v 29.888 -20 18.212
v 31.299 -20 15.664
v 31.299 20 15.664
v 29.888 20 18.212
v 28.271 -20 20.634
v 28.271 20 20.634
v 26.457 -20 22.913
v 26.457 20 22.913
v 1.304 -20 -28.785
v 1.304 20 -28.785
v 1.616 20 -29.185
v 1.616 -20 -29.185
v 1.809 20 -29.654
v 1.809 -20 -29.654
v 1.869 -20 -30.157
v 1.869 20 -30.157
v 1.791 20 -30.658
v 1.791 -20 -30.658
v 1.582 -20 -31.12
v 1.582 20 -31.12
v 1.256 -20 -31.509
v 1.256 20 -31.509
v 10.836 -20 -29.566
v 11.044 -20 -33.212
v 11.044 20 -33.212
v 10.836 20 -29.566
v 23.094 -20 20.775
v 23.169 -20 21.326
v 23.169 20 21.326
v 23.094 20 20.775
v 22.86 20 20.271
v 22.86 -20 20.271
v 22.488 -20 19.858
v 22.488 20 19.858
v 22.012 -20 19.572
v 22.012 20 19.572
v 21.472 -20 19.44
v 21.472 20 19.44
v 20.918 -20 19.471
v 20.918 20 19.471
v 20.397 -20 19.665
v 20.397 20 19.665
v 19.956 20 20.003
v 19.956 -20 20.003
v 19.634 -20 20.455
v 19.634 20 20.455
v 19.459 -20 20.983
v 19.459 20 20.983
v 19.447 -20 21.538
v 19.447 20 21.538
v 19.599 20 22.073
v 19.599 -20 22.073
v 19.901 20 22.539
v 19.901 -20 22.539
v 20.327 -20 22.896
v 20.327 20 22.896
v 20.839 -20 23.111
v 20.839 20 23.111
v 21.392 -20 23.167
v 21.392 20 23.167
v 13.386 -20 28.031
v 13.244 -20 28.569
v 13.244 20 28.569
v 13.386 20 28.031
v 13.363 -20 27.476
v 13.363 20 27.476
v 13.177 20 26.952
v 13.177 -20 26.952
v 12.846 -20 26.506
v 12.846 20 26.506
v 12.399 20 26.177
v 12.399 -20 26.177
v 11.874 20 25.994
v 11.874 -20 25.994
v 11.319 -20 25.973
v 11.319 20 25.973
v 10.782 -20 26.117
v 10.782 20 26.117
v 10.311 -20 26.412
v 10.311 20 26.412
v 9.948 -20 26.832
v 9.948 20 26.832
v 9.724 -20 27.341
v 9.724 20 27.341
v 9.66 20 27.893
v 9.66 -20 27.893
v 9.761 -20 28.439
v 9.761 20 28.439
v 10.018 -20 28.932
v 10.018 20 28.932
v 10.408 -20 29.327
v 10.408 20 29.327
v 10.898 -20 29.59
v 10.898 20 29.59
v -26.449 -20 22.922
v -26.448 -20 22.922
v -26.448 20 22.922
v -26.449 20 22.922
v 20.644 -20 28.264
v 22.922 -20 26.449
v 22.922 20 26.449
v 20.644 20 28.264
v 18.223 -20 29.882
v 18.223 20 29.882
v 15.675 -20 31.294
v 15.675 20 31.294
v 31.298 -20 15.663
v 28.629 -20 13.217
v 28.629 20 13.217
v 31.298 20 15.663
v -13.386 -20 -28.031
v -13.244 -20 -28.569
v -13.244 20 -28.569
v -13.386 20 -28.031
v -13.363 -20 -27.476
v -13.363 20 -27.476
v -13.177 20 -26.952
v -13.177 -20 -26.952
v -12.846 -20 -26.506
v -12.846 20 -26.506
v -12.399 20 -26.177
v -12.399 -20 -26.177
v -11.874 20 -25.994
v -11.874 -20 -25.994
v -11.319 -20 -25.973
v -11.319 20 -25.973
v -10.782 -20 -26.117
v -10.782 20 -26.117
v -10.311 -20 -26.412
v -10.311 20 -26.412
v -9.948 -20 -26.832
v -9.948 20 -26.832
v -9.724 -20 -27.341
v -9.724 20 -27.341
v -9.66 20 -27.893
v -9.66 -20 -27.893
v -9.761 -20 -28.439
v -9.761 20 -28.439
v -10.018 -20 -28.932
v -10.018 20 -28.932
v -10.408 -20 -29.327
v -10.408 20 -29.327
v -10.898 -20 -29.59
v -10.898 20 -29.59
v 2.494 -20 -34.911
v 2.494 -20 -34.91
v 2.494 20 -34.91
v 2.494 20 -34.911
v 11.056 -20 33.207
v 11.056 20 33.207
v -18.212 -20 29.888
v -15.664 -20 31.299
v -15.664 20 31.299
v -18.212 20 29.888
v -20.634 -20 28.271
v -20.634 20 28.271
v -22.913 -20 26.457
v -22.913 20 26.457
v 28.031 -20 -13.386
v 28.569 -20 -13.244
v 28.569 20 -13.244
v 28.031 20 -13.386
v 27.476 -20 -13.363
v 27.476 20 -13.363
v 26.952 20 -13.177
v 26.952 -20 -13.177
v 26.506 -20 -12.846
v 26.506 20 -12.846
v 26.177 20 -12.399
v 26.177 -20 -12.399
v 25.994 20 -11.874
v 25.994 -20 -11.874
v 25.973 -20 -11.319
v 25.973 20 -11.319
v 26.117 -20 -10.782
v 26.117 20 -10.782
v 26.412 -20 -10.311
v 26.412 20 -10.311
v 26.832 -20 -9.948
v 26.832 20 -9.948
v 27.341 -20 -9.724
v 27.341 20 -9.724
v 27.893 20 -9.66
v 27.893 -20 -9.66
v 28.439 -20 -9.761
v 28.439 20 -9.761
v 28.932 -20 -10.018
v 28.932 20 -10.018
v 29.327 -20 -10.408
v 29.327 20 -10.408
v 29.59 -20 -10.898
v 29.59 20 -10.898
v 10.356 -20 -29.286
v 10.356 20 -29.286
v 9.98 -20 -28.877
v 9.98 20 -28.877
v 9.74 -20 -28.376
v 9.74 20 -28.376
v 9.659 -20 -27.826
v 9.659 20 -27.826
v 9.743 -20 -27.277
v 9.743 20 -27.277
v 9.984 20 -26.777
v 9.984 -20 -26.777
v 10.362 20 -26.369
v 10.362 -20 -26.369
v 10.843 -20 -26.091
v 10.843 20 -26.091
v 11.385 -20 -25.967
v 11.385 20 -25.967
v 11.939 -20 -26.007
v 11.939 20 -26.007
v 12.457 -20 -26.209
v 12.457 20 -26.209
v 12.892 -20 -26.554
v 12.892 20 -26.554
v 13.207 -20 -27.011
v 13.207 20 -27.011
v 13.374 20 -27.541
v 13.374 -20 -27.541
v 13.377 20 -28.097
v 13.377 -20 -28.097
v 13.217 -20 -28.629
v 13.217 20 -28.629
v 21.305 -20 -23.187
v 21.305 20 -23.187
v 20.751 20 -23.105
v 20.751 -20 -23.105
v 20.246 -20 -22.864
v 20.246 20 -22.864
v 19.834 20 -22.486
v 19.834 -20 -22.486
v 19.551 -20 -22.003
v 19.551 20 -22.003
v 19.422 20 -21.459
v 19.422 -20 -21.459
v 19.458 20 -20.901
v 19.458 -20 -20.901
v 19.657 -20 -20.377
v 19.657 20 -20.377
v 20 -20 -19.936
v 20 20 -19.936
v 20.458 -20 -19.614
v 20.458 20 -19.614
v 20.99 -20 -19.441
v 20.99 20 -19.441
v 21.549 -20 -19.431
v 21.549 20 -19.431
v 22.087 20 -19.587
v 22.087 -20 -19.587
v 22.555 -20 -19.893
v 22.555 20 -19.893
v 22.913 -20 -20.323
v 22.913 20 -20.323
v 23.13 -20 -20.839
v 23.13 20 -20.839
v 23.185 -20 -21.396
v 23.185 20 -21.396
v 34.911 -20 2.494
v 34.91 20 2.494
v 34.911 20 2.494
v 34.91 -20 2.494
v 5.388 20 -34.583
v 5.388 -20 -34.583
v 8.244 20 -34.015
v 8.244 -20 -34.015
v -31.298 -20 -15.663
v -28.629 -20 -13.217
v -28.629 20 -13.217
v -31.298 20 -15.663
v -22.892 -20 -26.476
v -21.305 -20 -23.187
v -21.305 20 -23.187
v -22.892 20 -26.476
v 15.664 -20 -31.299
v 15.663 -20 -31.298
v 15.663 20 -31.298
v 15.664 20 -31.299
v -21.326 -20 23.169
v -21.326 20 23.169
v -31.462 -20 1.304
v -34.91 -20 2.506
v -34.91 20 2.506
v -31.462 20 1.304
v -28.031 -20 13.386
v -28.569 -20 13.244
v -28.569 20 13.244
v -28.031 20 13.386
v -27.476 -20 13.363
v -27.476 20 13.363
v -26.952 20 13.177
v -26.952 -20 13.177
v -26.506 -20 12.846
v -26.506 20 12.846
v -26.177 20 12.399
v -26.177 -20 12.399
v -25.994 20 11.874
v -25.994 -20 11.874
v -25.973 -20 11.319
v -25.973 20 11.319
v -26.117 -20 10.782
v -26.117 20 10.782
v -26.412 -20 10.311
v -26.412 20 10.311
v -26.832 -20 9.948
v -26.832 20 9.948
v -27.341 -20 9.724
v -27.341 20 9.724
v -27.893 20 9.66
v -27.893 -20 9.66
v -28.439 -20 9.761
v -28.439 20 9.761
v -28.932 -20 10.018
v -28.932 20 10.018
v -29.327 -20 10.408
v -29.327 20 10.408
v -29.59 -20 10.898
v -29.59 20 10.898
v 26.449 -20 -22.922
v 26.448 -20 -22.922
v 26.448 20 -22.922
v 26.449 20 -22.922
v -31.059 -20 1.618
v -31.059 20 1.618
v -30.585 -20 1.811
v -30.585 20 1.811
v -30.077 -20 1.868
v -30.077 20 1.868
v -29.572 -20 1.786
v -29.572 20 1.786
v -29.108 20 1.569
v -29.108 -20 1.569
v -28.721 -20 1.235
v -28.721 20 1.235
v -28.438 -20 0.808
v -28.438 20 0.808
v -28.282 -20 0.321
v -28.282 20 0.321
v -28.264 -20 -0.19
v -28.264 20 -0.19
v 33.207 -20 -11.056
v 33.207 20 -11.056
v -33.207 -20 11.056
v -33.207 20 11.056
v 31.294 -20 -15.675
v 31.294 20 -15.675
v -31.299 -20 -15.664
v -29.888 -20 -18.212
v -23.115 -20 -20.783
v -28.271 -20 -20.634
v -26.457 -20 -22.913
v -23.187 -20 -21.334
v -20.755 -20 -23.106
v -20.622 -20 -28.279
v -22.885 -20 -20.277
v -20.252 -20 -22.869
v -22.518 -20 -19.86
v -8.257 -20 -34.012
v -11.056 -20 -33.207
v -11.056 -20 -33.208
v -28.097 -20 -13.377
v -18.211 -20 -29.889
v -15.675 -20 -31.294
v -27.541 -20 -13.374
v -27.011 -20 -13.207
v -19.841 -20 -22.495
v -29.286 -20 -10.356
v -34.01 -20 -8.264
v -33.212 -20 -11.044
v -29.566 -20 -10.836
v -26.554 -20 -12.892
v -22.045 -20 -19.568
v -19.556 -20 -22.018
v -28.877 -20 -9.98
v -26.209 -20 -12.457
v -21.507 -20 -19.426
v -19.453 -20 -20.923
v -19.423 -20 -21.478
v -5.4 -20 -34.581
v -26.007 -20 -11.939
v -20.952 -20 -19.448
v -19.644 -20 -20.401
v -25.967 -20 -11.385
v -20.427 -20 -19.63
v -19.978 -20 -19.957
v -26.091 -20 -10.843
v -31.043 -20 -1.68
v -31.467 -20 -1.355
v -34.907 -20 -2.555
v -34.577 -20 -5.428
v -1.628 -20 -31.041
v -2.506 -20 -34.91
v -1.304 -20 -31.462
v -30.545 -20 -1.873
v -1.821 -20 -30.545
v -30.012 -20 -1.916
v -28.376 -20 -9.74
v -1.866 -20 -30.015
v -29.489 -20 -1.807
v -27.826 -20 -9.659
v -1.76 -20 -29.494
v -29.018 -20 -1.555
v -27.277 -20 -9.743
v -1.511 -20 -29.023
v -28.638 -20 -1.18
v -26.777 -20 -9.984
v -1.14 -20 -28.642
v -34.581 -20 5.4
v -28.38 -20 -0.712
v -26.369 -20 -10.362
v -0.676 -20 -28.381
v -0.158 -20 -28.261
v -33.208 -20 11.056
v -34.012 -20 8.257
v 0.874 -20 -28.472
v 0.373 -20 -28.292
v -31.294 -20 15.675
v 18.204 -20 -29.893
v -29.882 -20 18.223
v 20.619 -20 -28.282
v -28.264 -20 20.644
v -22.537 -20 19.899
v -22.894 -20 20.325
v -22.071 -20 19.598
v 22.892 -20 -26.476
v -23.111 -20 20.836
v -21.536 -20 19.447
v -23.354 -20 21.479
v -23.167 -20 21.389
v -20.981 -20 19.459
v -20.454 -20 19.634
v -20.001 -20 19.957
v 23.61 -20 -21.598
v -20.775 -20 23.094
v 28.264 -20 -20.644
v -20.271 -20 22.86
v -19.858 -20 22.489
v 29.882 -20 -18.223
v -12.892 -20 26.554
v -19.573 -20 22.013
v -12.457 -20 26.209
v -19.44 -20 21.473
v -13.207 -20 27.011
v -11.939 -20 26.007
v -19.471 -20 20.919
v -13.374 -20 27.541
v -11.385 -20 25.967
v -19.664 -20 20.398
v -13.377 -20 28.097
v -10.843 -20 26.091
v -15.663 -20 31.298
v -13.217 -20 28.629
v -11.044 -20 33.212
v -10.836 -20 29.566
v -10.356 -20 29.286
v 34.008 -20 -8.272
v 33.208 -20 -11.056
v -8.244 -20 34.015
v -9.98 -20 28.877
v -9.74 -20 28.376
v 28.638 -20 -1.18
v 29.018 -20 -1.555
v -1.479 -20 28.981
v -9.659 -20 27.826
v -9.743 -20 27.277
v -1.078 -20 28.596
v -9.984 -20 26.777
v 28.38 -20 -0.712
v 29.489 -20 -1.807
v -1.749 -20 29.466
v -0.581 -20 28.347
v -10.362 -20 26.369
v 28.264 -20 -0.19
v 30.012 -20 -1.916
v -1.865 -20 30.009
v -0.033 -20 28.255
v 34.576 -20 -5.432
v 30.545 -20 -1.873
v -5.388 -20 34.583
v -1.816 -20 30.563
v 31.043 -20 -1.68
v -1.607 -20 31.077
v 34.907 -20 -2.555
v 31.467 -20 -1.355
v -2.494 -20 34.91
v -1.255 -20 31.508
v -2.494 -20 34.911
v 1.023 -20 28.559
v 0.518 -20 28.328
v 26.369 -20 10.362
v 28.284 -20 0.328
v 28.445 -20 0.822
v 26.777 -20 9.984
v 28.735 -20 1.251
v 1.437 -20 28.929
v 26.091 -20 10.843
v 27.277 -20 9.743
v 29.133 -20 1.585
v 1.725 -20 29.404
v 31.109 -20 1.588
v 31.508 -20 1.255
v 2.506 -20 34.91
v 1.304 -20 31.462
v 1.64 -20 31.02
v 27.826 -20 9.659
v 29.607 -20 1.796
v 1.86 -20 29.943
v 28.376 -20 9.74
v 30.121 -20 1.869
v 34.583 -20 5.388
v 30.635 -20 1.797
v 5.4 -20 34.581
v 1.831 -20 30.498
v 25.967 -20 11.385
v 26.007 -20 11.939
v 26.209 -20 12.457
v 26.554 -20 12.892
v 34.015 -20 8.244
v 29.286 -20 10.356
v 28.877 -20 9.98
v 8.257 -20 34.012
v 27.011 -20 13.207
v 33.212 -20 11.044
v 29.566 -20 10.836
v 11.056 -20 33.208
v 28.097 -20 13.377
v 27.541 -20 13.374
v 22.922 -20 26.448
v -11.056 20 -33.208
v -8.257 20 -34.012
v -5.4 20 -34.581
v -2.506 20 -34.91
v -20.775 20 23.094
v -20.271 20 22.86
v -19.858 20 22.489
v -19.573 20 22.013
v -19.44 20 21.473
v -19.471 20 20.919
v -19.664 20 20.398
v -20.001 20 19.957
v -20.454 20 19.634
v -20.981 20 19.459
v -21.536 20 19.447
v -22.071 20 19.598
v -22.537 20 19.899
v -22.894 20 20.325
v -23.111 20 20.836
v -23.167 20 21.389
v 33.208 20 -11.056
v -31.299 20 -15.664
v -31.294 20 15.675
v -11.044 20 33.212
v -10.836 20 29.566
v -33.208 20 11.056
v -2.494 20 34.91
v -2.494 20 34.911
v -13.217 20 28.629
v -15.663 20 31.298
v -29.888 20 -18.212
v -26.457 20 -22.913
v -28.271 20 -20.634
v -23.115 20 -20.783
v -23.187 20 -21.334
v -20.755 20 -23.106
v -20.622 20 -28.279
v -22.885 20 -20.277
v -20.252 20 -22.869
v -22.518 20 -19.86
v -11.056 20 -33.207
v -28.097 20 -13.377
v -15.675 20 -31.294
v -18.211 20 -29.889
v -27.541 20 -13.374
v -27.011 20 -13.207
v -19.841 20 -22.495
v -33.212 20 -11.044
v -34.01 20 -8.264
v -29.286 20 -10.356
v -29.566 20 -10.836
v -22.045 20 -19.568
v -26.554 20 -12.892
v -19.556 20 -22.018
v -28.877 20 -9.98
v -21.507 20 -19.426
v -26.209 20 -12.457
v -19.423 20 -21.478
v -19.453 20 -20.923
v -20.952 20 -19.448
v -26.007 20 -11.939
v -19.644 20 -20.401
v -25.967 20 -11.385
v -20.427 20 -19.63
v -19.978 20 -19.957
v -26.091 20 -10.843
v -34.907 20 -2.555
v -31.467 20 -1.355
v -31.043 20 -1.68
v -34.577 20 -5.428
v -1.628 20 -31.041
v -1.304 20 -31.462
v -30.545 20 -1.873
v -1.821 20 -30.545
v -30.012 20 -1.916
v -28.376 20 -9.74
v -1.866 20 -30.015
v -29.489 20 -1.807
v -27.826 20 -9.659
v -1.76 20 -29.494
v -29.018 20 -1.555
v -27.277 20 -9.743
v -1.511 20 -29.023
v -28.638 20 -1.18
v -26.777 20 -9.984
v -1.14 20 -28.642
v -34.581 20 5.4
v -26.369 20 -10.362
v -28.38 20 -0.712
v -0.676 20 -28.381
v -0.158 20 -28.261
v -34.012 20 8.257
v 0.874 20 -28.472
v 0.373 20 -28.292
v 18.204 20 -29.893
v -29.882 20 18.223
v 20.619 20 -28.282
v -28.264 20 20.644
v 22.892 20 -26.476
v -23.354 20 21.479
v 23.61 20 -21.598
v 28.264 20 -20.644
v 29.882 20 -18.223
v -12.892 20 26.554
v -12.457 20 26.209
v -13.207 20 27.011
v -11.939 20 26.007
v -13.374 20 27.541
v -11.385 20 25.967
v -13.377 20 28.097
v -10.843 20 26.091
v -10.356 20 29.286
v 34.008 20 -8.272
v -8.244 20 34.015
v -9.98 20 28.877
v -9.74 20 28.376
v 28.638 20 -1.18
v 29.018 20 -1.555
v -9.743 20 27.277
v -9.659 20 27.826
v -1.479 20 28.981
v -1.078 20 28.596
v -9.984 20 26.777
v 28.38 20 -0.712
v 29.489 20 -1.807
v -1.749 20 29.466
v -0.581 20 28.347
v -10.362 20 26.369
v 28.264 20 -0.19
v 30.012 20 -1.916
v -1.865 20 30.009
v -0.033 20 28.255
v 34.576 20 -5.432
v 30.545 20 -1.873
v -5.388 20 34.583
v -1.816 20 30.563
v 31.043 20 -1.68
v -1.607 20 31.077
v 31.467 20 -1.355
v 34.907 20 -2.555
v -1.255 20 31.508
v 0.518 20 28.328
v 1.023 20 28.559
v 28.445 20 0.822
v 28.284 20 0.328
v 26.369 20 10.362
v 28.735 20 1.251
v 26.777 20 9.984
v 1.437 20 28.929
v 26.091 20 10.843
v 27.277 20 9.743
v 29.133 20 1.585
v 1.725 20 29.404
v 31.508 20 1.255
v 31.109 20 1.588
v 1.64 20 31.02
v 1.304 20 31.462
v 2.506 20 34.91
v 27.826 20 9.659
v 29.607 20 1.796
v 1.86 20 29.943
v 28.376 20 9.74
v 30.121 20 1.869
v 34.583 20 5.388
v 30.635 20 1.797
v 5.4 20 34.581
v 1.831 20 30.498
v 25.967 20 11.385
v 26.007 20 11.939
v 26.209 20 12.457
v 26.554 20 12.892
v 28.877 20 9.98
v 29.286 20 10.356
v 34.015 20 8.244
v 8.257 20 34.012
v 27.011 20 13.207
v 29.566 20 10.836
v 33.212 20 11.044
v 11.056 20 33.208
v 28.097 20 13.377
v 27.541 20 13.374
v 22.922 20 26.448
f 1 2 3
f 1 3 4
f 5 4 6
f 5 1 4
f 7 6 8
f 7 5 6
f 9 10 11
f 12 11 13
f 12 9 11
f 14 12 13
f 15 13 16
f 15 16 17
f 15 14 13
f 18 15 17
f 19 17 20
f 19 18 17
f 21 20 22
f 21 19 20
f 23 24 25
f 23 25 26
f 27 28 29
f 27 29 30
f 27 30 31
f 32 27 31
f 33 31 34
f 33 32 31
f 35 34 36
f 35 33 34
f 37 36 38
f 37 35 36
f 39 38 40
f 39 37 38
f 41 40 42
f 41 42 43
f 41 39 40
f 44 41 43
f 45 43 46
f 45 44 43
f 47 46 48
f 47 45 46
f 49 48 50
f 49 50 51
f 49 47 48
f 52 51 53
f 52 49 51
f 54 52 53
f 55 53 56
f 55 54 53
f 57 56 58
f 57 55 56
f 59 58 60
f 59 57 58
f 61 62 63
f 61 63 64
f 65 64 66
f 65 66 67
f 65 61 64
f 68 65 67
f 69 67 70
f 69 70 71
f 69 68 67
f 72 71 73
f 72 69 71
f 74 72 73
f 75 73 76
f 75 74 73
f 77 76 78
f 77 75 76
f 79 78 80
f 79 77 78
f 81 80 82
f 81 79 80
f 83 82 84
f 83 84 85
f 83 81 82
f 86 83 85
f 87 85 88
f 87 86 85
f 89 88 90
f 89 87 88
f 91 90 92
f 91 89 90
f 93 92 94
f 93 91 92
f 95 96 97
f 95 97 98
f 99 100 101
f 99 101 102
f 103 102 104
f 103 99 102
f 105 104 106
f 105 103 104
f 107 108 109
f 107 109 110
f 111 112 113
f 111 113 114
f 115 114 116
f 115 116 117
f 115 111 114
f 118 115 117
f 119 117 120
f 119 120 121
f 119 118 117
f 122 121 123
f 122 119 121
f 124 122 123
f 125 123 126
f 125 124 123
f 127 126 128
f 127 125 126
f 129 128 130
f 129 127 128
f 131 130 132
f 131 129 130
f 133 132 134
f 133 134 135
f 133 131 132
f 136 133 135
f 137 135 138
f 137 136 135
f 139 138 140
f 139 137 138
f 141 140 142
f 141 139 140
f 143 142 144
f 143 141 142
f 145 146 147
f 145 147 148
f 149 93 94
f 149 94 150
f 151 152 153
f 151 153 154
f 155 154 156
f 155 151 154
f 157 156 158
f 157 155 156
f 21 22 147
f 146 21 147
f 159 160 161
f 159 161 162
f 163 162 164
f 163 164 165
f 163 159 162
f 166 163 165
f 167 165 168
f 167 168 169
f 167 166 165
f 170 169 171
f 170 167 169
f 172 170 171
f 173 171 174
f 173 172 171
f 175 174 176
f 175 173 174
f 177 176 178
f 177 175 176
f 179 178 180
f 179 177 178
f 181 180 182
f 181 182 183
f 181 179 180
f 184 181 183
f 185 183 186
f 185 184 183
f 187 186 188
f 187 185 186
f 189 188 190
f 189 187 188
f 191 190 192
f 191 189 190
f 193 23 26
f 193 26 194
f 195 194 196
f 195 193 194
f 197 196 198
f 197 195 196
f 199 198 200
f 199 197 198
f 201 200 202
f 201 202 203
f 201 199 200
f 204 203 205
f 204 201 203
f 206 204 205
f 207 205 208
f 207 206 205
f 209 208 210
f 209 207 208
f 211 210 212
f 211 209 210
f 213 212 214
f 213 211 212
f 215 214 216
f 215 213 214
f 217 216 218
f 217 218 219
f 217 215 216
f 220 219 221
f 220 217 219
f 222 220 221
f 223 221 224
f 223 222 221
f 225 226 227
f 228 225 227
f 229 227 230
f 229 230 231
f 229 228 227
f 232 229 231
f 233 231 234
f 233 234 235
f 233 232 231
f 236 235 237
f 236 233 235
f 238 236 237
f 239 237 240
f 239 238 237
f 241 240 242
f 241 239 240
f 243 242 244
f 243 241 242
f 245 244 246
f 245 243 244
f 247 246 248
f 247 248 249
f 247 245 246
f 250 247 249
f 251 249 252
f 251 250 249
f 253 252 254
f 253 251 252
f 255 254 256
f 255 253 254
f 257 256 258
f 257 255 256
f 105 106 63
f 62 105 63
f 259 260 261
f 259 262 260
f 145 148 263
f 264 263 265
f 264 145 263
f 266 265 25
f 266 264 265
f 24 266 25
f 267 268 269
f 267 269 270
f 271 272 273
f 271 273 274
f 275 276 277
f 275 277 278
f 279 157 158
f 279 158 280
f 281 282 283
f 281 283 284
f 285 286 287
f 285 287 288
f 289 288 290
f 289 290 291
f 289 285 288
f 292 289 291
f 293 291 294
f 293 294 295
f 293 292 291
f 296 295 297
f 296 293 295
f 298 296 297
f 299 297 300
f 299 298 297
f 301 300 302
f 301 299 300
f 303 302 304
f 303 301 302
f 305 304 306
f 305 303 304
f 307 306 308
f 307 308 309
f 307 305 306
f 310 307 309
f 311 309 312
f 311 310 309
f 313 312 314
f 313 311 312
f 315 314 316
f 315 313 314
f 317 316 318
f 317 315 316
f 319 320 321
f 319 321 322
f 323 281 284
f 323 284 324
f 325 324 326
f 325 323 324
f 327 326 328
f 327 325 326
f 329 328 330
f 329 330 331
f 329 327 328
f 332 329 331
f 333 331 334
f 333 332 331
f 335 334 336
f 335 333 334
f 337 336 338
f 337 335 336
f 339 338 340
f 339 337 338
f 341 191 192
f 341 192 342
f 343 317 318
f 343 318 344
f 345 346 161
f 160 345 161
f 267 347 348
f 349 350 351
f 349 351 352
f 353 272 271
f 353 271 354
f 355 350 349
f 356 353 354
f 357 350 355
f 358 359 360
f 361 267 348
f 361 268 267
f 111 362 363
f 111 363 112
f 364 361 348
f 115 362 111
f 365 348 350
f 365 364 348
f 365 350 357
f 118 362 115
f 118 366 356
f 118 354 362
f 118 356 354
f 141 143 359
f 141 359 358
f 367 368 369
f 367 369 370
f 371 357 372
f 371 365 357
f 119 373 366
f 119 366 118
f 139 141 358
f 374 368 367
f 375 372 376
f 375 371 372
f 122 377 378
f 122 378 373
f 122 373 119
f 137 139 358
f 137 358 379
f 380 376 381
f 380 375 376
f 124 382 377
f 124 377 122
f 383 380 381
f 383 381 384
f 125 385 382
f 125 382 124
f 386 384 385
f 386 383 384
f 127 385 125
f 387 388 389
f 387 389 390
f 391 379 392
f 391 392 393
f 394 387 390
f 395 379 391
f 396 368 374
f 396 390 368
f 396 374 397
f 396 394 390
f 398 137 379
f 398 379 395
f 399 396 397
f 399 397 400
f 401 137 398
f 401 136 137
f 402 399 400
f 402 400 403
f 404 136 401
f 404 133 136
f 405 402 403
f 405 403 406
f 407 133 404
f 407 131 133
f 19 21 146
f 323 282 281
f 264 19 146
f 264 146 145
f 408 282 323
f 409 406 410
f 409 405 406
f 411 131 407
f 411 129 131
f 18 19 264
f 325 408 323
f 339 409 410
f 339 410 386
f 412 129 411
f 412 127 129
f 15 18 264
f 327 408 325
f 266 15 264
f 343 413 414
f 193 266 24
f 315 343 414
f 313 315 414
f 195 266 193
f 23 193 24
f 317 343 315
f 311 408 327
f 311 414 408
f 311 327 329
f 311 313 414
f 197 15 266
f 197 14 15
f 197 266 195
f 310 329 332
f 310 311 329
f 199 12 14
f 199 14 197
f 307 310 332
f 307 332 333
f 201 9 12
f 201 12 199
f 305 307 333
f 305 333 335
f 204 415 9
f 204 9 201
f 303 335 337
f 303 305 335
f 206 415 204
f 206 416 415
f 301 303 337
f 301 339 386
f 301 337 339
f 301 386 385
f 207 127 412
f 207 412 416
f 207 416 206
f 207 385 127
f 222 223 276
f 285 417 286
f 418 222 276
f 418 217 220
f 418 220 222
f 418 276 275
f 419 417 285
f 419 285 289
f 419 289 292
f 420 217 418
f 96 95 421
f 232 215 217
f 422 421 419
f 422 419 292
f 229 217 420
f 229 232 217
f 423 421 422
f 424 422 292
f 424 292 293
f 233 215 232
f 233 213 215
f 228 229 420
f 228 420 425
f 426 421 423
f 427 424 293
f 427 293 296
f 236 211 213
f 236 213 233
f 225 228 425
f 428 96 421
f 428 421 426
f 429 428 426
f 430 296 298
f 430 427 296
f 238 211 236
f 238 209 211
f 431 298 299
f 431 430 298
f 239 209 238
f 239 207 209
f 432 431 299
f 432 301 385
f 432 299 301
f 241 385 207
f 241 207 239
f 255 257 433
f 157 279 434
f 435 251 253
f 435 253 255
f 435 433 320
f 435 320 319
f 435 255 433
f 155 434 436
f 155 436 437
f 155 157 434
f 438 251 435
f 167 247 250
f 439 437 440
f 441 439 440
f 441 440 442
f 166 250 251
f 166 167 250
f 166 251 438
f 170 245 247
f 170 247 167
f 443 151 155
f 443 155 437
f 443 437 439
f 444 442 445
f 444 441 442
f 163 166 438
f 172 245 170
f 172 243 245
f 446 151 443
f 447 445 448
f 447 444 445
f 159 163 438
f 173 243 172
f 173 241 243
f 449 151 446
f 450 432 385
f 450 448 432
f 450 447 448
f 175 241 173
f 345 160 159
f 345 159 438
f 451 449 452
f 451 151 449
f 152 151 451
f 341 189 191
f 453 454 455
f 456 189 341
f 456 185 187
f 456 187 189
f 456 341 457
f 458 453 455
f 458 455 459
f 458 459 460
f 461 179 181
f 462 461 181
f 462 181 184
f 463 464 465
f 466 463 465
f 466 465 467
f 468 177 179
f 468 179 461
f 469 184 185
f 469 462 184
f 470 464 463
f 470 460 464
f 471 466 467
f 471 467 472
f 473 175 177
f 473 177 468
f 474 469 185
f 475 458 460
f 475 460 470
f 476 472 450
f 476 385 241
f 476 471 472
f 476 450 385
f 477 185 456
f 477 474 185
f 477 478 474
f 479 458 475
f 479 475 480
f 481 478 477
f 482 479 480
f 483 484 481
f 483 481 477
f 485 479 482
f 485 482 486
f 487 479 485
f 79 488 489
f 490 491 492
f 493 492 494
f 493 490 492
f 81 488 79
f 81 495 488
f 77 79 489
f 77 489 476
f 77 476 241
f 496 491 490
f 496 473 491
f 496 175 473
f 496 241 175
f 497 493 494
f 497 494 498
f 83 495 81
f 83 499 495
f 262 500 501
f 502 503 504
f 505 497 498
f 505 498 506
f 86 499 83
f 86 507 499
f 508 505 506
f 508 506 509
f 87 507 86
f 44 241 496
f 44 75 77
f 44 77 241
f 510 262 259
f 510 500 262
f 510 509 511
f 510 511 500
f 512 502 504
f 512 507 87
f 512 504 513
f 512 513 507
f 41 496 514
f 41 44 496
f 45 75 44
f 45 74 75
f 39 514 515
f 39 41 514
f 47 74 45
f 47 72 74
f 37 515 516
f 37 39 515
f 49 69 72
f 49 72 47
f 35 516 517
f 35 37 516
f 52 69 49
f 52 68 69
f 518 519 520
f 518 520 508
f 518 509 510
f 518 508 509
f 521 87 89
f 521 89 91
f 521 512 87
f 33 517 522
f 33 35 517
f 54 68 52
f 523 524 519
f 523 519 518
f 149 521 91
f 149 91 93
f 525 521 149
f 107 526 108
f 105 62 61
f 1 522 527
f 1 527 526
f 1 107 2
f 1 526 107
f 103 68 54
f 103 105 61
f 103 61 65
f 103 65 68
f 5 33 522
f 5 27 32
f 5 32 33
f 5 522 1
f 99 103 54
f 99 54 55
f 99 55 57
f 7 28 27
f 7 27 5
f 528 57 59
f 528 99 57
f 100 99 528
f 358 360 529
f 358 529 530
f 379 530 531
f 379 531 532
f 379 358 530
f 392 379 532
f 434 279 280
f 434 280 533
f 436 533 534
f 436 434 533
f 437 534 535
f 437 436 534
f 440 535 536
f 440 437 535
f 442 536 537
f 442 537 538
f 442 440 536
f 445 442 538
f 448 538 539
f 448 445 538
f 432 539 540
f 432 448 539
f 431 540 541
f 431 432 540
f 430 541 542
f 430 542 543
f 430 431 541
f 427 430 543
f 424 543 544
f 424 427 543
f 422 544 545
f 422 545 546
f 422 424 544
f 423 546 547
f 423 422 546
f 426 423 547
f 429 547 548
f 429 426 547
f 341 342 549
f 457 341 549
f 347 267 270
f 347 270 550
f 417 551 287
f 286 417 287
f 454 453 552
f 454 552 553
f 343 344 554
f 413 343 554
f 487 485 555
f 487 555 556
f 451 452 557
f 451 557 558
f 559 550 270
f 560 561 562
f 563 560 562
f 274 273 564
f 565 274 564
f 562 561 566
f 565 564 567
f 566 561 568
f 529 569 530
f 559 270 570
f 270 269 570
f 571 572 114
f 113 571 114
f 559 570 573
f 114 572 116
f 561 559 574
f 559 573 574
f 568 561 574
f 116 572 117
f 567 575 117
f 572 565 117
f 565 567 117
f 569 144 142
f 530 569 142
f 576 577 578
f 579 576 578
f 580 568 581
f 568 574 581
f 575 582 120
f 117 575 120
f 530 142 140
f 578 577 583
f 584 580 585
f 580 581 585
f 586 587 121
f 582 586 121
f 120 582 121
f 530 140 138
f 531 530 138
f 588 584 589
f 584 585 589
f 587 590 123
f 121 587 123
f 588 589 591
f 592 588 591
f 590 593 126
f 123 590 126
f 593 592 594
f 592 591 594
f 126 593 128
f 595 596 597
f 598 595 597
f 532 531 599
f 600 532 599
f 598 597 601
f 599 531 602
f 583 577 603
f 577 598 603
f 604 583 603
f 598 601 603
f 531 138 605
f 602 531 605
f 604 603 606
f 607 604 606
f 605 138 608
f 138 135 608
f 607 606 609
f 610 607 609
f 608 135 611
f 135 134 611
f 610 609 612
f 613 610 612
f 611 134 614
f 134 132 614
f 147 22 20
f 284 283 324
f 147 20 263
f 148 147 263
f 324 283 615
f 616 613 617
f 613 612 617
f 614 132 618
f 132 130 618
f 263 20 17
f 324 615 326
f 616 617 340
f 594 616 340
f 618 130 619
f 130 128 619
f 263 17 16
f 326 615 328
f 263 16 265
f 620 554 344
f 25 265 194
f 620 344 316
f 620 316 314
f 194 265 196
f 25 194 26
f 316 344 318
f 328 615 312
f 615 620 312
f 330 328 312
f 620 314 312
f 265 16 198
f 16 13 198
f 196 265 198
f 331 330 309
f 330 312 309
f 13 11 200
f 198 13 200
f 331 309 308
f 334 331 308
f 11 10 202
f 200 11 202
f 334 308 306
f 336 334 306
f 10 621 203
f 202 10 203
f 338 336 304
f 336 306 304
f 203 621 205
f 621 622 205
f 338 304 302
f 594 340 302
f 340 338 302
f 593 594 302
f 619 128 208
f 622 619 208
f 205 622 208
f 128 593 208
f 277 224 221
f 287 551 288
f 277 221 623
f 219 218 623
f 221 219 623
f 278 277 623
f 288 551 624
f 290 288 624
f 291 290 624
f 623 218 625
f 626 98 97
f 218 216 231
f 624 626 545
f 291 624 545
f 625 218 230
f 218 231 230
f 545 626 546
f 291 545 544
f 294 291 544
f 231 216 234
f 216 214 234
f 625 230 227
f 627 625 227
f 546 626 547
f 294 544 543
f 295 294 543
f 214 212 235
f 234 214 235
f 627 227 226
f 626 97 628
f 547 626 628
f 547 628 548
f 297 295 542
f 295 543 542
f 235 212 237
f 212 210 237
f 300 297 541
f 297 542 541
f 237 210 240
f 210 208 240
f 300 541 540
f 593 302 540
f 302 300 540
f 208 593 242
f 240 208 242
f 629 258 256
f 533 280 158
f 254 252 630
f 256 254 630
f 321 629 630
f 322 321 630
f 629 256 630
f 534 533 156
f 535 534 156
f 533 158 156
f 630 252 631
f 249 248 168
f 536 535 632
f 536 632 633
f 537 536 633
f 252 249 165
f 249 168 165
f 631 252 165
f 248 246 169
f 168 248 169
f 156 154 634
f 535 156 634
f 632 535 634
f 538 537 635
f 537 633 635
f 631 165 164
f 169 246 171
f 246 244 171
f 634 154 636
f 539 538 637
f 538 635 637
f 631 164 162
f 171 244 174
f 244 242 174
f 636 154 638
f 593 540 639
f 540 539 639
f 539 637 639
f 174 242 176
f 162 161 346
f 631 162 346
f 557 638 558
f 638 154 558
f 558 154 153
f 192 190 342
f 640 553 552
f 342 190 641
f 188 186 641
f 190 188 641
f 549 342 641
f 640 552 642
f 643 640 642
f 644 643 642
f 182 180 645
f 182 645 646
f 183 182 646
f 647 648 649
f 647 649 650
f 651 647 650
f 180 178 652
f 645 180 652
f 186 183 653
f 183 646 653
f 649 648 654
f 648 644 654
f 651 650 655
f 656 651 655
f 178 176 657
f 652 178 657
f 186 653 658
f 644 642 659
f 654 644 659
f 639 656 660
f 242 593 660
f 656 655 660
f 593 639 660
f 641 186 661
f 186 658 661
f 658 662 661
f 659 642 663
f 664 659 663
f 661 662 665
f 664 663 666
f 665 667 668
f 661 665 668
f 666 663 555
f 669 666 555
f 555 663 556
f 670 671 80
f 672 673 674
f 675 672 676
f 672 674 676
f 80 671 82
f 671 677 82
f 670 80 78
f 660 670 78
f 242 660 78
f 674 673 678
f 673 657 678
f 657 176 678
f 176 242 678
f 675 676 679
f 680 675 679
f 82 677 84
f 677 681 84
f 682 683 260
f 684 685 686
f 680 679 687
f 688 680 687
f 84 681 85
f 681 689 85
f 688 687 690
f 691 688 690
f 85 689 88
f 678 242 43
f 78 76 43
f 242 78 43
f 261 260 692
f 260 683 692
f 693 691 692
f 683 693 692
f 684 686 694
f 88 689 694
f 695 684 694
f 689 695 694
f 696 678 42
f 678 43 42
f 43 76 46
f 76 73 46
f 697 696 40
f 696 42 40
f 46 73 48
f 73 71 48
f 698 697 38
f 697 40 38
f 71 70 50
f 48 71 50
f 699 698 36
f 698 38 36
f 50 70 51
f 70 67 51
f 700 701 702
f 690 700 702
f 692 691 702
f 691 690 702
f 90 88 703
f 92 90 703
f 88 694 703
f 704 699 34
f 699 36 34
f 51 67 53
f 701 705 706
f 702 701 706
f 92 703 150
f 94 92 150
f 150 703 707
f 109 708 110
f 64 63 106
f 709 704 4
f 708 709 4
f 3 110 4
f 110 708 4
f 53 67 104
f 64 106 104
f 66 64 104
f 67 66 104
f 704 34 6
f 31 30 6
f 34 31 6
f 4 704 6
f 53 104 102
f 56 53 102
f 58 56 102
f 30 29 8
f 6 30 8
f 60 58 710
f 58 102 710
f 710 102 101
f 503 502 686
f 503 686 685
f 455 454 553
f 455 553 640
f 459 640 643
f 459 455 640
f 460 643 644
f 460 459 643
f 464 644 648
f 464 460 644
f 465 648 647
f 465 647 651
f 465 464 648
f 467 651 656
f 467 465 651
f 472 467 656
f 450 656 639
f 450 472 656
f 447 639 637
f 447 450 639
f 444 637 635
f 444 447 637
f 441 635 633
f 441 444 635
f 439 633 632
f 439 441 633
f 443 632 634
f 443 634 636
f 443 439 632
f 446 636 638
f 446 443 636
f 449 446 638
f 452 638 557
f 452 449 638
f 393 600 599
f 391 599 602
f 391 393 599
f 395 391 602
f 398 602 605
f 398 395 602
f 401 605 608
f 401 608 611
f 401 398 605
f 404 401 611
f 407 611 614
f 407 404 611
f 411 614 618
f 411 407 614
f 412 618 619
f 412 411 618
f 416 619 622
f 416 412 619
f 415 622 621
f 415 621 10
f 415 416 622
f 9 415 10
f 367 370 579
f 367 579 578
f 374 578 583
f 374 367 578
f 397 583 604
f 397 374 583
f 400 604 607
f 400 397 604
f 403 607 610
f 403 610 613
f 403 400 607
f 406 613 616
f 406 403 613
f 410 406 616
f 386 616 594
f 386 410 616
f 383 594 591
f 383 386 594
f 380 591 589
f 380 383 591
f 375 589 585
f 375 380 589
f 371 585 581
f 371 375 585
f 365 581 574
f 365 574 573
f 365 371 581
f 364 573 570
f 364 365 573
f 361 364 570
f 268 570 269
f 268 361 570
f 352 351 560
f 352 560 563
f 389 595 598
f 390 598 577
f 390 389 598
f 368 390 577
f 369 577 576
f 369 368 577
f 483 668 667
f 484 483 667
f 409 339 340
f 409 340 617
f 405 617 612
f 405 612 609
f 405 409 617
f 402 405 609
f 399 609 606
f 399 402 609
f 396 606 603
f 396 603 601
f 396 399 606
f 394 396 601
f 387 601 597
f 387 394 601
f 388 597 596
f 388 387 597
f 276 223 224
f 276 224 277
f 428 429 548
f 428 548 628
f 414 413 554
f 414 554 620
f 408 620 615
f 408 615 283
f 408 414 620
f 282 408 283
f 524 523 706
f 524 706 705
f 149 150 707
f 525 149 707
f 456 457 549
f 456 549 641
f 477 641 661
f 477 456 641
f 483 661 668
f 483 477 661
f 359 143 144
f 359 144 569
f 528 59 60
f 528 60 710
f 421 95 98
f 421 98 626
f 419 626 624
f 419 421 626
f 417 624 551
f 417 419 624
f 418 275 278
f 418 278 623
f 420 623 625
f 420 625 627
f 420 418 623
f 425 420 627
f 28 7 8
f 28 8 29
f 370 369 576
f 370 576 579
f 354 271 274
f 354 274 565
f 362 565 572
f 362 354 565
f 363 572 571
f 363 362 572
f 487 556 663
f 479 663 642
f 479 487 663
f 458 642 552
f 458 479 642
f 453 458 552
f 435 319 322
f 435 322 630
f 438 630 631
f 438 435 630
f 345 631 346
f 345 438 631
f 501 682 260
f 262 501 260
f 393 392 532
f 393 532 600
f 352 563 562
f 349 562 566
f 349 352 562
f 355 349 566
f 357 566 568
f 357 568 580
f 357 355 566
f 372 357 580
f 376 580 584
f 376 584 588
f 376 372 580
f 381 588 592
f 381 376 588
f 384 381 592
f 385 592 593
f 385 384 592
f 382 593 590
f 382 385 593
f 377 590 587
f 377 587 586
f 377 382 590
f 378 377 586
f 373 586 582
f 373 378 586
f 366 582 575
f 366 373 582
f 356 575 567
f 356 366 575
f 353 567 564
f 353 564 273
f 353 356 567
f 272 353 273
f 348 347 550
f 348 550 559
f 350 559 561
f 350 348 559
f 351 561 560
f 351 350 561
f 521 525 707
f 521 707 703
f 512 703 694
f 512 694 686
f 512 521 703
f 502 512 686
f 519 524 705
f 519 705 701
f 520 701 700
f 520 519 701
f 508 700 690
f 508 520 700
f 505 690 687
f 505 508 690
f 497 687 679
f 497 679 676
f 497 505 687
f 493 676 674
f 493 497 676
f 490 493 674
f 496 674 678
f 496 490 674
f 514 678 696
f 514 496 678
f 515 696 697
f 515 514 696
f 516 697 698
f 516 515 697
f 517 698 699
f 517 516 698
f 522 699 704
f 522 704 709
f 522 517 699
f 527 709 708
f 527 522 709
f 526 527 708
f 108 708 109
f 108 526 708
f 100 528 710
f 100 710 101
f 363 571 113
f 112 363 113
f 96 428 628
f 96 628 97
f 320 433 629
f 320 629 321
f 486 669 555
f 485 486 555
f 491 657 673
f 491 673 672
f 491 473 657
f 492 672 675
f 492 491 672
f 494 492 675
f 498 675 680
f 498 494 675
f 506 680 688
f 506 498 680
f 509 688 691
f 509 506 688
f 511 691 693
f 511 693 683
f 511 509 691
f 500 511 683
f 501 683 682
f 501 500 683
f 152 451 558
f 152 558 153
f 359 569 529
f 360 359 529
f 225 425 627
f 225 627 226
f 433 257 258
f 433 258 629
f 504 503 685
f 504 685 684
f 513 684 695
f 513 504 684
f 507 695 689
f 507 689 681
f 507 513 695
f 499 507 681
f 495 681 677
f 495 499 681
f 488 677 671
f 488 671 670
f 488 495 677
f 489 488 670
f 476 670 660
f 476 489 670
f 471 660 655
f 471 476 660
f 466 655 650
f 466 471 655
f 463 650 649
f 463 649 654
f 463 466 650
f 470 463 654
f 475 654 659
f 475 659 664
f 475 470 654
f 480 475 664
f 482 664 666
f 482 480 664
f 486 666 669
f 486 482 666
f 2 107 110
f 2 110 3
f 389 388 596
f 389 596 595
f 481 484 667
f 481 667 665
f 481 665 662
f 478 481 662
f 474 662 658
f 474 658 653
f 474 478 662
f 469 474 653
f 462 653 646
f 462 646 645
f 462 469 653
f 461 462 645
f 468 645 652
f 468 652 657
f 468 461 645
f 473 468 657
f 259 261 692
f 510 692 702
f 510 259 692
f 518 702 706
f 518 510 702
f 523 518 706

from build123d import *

# Parameters (mm, degrees)
F1_DEPTH = 20


# Not quite as in the source:
# - ends of sketch curves that miss each other by under 0.0002 mm in the source are joined


with BuildPart() as f1:
    # F0 (on Front) → F1 (new body, symmetric)
    with BuildSketch(Plane.XZ):
        with BuildLine():
            Line((34.9101450984, 2.4936542119), (34.9110309298, 2.4939766282))
            ThreePointArc((34.9110309298, 2.4939766282), (34.3286939173, 6.8220798831), (33.2119055423, 11.0439725756))
            Line((33.2119055423, 11.0439725756), (29.5663055038, 10.8358313755))
            ThreePointArc((29.5663055038, 10.8358313755), (26.0913542461, 10.8432258269), (28.6289762641, 13.2172130666))
            Line((28.6289762641, 13.2172130666), (31.2984883804, 15.6633702382))
            Line((31.2984883804, 15.6633702382), (31.2991833986, 15.6640071049))
            ThreePointArc((31.2991833986, 15.6640071049), (29.1048807425, 19.4398023901), (26.457454434, 22.9129462285))
            Line((26.457454434, 22.9129462285), (23.1690113636, 21.3255380981))
            ThreePointArc((23.1690113636, 21.3255380981), (19.9557452862, 20.0025634058), (21.3917167446, 23.1669475309))
            Line((21.3917167446, 23.1669475309), (22.9219205281, 26.4484801345))
            Line((22.9219205281, 26.4484801345), (22.9223189227, 26.4493344946))
            ThreePointArc((22.9223189227, 26.4493344946), (19.450113311, 29.0979912054), (15.6750957256, 31.2936315245))
            Line((15.6750957256, 31.2936315245), (13.2444452709, 28.5686249618))
            ThreePointArc((13.2444452709, 28.5686249618), (10.7820550057, 26.1166920299), (10.897762267, 29.5897242426))
            Line((10.897762267, 29.5897242426), (11.055698063, 33.2070486864))
            Line((11.055698063, 33.2070486864), (11.0557391823, 33.2079904712))
            ThreePointArc((11.0557391823, 33.2079904712), (6.8342424437, 34.3262746336), (2.5063457881, 34.9101450984))
            Line((2.5063457881, 34.9101450984), (1.3035324469, 31.4623976502))
            ThreePointArc((1.3035324469, 31.4623976502), (-0.0331054099, 28.2547910408), (-1.2552777272, 31.5077336698))
            Line((-1.2552777272, 31.5077336698), (-2.4936542119, 34.9101450984))
            Line((-2.4936542119, 34.9101450984), (-2.4939766282, 34.9110309298))
            ThreePointArc((-2.4939766282, 34.9110309298), (-6.8220798831, 34.3286939173), (-11.0439725756, 33.2119055423))
            Line((-11.0439725756, 33.2119055423), (-10.8358313755, 29.5663055038))
            ThreePointArc((-10.8358313755, 29.5663055038), (-10.8432258269, 26.0913542461), (-13.2172130666, 28.6289762641))
            Line((-13.2172130666, 28.6289762641), (-15.6633702382, 31.2984883804))
            Line((-15.6633702382, 31.2984883804), (-15.6640071049, 31.2991833986))
            ThreePointArc((-15.6640071049, 31.2991833986), (-19.4398023901, 29.1048807425), (-22.9129462285, 26.457454434))
            Line((-22.9129462285, 26.457454434), (-21.3255380981, 23.1690113636))
            ThreePointArc((-21.3255380981, 23.1690113636), (-20.0014808321, 19.9567910089), (-23.1670922293, 21.3887099076))
            Line((-23.1670922293, 21.3887099076), (-23.3543714527, 21.4791139546))
            Line((-23.3543714527, 21.4791139546), (-26.4484801345, 22.9219205281))
            Line((-26.4484801345, 22.9219205281), (-26.4493344946, 22.9223189227))
            ThreePointArc((-26.4493344946, 22.9223189227), (-29.0979912054, 19.450113311), (-31.2936315245, 15.6750957256))
            Line((-31.2936315245, 15.6750957256), (-28.5686249618, 13.2444452709))
            ThreePointArc((-28.5686249618, 13.2444452709), (-26.1166920299, 10.7820550057), (-29.5897242426, 10.897762267))
            Line((-29.5897242426, 10.897762267), (-33.2070486864, 11.055698063))
            Line((-33.2070486864, 11.055698063), (-33.2079904712, 11.0557391823))
            ThreePointArc((-33.2079904712, 11.0557391823), (-34.3262746336, 6.8342424437), (-34.9101450984, 2.5063457881))
            Line((-34.9101450984, 2.5063457881), (-31.4623976502, 1.3035324469))
            ThreePointArc((-31.4623976502, 1.3035324469), (-29.3324543071, 1.6932130885), (-28.2642048894, -0.1902286623))
            ThreePointArc((-28.2642048894, -0.1902286623), (-29.4892446104, -1.8074791131), (-31.4669238904, -1.3547032257))
            Line((-31.4669238904, -1.3547032257), (-34.9066388382, -2.5547142739))
            ThreePointArc((-34.9066388382, -2.5547142739), (-34.3227460841, -6.8519414215), (-33.2119055423, -11.0439725756))
            Line((-33.2119055423, -11.0439725756), (-29.5663055038, -10.8358313755))
            ThreePointArc((-29.5663055038, -10.8358313755), (-26.0913542461, -10.8432258269), (-28.6289762641, -13.2172130666))
            Line((-28.6289762641, -13.2172130666), (-31.2984883804, -15.6633702382))
            Line((-31.2984883804, -15.6633702382), (-31.2991833986, -15.6640071049))
            ThreePointArc((-31.2991833986, -15.6640071049), (-29.1048807425, -19.4398023901), (-26.457454434, -22.9129462285))
            Line((-26.457454434, -22.9129462285), (-23.1867866645, -21.3341186503))
            ThreePointArc((-23.1867866645, -21.3341186503), (-19.9778704256, -19.9570429396), (-21.3046655311, -23.1870732319))
            Line((-21.3046655311, -23.1870732319), (-22.8920736615, -26.4755163023))
            ThreePointArc((-22.8920736615, -26.4755163023), (-19.4334813455, -29.1091017174), (-15.6750957256, -31.2936315245))
            Line((-15.6750957256, -31.2936315245), (-13.2444452709, -28.5686249618))
            ThreePointArc((-13.2444452709, -28.5686249618), (-10.7820550057, -26.1166920299), (-10.897762267, -29.5897242426))
            Line((-10.897762267, -29.5897242426), (-11.055698063, -33.2070486864))
            Line((-11.055698063, -33.2070486864), (-11.0557391823, -33.2079904712))
            ThreePointArc((-11.0557391823, -33.2079904712), (-6.8342424437, -34.3262746336), (-2.5063457881, -34.9101450984))
            Line((-2.5063457881, -34.9101450984), (-1.3035324469, -31.4623976502))
            ThreePointArc((-1.3035324469, -31.4623976502), (-1.3388311966, -28.8194805066), (1.3040932823, -28.7847353157))
            ThreePointArc((1.3040932823, -28.7847353157), (1.8690592706, -30.1571657006), (1.2555114416, -31.5085763676))
            Line((1.2555114416, -31.5085763676), (2.4936542119, -34.9101450984))
            Line((2.4936542119, -34.9101450984), (2.4939766282, -34.9110309298))
            ThreePointArc((2.4939766282, -34.9110309298), (6.8220798831, -34.3286939173), (11.0439725756, -33.2119055423))
            Line((11.0439725756, -33.2119055423), (10.8358313755, -29.5663055038))
            ThreePointArc((10.8358313755, -29.5663055038), (10.8432258269, -26.0913542461), (13.2172130666, -28.6289762641))
            Line((13.2172130666, -28.6289762641), (15.6633702382, -31.2984883804))
            Line((15.6633702382, -31.2984883804), (15.6640071049, -31.2991833986))
            ThreePointArc((15.6640071049, -31.2991833986), (19.4283242222, -29.112543996), (22.8920736615, -26.4755163023))
            Line((22.8920736615, -26.4755163023), (21.3046655311, -23.1870732319))
            ThreePointArc((21.3046655311, -23.1870732319), (19.9999615902, -19.9356459921), (23.1847053682, -21.3955906956))
            Line((23.1847053682, -21.3955906956), (23.6096103837, -21.5981338228))
            Line((23.6096103837, -21.5981338228), (26.4484801345, -22.9219205281))
            Line((26.4484801345, -22.9219205281), (26.4493344946, -22.9223189227))
            ThreePointArc((26.4493344946, -22.9223189227), (29.0979912054, -19.450113311), (31.2936315245, -15.6750957256))
            Line((31.2936315245, -15.6750957256), (28.5686249618, -13.2444452709))
            ThreePointArc((28.5686249618, -13.2444452709), (26.1166920299, -10.7820550057), (29.5897242426, -10.897762267))
            Line((29.5897242426, -10.897762267), (33.2070486864, -11.055698063))
            Line((33.2070486864, -11.055698063), (33.2079904712, -11.0557391823))
            ThreePointArc((33.2079904712, -11.0557391823), (34.3215316909, -6.8580217548), (34.9066388382, -2.5547142739))
            Line((34.9066388382, -2.5547142739), (31.4669238904, -1.3547032257))
            ThreePointArc((31.4669238904, -1.3547032257), (29.4892446104, -1.8074791131), (28.2642048894, -0.1902286623))
            ThreePointArc((28.2642048894, -0.1902286623), (29.3625733997, 1.7069569752), (31.5077336698, 1.2552777272))
            Line((31.5077336698, 1.2552777272), (34.9101450984, 2.4936542119))
        make_face()
    extrude(amount=F1_DEPTH, both=True)


solid = f1.part
